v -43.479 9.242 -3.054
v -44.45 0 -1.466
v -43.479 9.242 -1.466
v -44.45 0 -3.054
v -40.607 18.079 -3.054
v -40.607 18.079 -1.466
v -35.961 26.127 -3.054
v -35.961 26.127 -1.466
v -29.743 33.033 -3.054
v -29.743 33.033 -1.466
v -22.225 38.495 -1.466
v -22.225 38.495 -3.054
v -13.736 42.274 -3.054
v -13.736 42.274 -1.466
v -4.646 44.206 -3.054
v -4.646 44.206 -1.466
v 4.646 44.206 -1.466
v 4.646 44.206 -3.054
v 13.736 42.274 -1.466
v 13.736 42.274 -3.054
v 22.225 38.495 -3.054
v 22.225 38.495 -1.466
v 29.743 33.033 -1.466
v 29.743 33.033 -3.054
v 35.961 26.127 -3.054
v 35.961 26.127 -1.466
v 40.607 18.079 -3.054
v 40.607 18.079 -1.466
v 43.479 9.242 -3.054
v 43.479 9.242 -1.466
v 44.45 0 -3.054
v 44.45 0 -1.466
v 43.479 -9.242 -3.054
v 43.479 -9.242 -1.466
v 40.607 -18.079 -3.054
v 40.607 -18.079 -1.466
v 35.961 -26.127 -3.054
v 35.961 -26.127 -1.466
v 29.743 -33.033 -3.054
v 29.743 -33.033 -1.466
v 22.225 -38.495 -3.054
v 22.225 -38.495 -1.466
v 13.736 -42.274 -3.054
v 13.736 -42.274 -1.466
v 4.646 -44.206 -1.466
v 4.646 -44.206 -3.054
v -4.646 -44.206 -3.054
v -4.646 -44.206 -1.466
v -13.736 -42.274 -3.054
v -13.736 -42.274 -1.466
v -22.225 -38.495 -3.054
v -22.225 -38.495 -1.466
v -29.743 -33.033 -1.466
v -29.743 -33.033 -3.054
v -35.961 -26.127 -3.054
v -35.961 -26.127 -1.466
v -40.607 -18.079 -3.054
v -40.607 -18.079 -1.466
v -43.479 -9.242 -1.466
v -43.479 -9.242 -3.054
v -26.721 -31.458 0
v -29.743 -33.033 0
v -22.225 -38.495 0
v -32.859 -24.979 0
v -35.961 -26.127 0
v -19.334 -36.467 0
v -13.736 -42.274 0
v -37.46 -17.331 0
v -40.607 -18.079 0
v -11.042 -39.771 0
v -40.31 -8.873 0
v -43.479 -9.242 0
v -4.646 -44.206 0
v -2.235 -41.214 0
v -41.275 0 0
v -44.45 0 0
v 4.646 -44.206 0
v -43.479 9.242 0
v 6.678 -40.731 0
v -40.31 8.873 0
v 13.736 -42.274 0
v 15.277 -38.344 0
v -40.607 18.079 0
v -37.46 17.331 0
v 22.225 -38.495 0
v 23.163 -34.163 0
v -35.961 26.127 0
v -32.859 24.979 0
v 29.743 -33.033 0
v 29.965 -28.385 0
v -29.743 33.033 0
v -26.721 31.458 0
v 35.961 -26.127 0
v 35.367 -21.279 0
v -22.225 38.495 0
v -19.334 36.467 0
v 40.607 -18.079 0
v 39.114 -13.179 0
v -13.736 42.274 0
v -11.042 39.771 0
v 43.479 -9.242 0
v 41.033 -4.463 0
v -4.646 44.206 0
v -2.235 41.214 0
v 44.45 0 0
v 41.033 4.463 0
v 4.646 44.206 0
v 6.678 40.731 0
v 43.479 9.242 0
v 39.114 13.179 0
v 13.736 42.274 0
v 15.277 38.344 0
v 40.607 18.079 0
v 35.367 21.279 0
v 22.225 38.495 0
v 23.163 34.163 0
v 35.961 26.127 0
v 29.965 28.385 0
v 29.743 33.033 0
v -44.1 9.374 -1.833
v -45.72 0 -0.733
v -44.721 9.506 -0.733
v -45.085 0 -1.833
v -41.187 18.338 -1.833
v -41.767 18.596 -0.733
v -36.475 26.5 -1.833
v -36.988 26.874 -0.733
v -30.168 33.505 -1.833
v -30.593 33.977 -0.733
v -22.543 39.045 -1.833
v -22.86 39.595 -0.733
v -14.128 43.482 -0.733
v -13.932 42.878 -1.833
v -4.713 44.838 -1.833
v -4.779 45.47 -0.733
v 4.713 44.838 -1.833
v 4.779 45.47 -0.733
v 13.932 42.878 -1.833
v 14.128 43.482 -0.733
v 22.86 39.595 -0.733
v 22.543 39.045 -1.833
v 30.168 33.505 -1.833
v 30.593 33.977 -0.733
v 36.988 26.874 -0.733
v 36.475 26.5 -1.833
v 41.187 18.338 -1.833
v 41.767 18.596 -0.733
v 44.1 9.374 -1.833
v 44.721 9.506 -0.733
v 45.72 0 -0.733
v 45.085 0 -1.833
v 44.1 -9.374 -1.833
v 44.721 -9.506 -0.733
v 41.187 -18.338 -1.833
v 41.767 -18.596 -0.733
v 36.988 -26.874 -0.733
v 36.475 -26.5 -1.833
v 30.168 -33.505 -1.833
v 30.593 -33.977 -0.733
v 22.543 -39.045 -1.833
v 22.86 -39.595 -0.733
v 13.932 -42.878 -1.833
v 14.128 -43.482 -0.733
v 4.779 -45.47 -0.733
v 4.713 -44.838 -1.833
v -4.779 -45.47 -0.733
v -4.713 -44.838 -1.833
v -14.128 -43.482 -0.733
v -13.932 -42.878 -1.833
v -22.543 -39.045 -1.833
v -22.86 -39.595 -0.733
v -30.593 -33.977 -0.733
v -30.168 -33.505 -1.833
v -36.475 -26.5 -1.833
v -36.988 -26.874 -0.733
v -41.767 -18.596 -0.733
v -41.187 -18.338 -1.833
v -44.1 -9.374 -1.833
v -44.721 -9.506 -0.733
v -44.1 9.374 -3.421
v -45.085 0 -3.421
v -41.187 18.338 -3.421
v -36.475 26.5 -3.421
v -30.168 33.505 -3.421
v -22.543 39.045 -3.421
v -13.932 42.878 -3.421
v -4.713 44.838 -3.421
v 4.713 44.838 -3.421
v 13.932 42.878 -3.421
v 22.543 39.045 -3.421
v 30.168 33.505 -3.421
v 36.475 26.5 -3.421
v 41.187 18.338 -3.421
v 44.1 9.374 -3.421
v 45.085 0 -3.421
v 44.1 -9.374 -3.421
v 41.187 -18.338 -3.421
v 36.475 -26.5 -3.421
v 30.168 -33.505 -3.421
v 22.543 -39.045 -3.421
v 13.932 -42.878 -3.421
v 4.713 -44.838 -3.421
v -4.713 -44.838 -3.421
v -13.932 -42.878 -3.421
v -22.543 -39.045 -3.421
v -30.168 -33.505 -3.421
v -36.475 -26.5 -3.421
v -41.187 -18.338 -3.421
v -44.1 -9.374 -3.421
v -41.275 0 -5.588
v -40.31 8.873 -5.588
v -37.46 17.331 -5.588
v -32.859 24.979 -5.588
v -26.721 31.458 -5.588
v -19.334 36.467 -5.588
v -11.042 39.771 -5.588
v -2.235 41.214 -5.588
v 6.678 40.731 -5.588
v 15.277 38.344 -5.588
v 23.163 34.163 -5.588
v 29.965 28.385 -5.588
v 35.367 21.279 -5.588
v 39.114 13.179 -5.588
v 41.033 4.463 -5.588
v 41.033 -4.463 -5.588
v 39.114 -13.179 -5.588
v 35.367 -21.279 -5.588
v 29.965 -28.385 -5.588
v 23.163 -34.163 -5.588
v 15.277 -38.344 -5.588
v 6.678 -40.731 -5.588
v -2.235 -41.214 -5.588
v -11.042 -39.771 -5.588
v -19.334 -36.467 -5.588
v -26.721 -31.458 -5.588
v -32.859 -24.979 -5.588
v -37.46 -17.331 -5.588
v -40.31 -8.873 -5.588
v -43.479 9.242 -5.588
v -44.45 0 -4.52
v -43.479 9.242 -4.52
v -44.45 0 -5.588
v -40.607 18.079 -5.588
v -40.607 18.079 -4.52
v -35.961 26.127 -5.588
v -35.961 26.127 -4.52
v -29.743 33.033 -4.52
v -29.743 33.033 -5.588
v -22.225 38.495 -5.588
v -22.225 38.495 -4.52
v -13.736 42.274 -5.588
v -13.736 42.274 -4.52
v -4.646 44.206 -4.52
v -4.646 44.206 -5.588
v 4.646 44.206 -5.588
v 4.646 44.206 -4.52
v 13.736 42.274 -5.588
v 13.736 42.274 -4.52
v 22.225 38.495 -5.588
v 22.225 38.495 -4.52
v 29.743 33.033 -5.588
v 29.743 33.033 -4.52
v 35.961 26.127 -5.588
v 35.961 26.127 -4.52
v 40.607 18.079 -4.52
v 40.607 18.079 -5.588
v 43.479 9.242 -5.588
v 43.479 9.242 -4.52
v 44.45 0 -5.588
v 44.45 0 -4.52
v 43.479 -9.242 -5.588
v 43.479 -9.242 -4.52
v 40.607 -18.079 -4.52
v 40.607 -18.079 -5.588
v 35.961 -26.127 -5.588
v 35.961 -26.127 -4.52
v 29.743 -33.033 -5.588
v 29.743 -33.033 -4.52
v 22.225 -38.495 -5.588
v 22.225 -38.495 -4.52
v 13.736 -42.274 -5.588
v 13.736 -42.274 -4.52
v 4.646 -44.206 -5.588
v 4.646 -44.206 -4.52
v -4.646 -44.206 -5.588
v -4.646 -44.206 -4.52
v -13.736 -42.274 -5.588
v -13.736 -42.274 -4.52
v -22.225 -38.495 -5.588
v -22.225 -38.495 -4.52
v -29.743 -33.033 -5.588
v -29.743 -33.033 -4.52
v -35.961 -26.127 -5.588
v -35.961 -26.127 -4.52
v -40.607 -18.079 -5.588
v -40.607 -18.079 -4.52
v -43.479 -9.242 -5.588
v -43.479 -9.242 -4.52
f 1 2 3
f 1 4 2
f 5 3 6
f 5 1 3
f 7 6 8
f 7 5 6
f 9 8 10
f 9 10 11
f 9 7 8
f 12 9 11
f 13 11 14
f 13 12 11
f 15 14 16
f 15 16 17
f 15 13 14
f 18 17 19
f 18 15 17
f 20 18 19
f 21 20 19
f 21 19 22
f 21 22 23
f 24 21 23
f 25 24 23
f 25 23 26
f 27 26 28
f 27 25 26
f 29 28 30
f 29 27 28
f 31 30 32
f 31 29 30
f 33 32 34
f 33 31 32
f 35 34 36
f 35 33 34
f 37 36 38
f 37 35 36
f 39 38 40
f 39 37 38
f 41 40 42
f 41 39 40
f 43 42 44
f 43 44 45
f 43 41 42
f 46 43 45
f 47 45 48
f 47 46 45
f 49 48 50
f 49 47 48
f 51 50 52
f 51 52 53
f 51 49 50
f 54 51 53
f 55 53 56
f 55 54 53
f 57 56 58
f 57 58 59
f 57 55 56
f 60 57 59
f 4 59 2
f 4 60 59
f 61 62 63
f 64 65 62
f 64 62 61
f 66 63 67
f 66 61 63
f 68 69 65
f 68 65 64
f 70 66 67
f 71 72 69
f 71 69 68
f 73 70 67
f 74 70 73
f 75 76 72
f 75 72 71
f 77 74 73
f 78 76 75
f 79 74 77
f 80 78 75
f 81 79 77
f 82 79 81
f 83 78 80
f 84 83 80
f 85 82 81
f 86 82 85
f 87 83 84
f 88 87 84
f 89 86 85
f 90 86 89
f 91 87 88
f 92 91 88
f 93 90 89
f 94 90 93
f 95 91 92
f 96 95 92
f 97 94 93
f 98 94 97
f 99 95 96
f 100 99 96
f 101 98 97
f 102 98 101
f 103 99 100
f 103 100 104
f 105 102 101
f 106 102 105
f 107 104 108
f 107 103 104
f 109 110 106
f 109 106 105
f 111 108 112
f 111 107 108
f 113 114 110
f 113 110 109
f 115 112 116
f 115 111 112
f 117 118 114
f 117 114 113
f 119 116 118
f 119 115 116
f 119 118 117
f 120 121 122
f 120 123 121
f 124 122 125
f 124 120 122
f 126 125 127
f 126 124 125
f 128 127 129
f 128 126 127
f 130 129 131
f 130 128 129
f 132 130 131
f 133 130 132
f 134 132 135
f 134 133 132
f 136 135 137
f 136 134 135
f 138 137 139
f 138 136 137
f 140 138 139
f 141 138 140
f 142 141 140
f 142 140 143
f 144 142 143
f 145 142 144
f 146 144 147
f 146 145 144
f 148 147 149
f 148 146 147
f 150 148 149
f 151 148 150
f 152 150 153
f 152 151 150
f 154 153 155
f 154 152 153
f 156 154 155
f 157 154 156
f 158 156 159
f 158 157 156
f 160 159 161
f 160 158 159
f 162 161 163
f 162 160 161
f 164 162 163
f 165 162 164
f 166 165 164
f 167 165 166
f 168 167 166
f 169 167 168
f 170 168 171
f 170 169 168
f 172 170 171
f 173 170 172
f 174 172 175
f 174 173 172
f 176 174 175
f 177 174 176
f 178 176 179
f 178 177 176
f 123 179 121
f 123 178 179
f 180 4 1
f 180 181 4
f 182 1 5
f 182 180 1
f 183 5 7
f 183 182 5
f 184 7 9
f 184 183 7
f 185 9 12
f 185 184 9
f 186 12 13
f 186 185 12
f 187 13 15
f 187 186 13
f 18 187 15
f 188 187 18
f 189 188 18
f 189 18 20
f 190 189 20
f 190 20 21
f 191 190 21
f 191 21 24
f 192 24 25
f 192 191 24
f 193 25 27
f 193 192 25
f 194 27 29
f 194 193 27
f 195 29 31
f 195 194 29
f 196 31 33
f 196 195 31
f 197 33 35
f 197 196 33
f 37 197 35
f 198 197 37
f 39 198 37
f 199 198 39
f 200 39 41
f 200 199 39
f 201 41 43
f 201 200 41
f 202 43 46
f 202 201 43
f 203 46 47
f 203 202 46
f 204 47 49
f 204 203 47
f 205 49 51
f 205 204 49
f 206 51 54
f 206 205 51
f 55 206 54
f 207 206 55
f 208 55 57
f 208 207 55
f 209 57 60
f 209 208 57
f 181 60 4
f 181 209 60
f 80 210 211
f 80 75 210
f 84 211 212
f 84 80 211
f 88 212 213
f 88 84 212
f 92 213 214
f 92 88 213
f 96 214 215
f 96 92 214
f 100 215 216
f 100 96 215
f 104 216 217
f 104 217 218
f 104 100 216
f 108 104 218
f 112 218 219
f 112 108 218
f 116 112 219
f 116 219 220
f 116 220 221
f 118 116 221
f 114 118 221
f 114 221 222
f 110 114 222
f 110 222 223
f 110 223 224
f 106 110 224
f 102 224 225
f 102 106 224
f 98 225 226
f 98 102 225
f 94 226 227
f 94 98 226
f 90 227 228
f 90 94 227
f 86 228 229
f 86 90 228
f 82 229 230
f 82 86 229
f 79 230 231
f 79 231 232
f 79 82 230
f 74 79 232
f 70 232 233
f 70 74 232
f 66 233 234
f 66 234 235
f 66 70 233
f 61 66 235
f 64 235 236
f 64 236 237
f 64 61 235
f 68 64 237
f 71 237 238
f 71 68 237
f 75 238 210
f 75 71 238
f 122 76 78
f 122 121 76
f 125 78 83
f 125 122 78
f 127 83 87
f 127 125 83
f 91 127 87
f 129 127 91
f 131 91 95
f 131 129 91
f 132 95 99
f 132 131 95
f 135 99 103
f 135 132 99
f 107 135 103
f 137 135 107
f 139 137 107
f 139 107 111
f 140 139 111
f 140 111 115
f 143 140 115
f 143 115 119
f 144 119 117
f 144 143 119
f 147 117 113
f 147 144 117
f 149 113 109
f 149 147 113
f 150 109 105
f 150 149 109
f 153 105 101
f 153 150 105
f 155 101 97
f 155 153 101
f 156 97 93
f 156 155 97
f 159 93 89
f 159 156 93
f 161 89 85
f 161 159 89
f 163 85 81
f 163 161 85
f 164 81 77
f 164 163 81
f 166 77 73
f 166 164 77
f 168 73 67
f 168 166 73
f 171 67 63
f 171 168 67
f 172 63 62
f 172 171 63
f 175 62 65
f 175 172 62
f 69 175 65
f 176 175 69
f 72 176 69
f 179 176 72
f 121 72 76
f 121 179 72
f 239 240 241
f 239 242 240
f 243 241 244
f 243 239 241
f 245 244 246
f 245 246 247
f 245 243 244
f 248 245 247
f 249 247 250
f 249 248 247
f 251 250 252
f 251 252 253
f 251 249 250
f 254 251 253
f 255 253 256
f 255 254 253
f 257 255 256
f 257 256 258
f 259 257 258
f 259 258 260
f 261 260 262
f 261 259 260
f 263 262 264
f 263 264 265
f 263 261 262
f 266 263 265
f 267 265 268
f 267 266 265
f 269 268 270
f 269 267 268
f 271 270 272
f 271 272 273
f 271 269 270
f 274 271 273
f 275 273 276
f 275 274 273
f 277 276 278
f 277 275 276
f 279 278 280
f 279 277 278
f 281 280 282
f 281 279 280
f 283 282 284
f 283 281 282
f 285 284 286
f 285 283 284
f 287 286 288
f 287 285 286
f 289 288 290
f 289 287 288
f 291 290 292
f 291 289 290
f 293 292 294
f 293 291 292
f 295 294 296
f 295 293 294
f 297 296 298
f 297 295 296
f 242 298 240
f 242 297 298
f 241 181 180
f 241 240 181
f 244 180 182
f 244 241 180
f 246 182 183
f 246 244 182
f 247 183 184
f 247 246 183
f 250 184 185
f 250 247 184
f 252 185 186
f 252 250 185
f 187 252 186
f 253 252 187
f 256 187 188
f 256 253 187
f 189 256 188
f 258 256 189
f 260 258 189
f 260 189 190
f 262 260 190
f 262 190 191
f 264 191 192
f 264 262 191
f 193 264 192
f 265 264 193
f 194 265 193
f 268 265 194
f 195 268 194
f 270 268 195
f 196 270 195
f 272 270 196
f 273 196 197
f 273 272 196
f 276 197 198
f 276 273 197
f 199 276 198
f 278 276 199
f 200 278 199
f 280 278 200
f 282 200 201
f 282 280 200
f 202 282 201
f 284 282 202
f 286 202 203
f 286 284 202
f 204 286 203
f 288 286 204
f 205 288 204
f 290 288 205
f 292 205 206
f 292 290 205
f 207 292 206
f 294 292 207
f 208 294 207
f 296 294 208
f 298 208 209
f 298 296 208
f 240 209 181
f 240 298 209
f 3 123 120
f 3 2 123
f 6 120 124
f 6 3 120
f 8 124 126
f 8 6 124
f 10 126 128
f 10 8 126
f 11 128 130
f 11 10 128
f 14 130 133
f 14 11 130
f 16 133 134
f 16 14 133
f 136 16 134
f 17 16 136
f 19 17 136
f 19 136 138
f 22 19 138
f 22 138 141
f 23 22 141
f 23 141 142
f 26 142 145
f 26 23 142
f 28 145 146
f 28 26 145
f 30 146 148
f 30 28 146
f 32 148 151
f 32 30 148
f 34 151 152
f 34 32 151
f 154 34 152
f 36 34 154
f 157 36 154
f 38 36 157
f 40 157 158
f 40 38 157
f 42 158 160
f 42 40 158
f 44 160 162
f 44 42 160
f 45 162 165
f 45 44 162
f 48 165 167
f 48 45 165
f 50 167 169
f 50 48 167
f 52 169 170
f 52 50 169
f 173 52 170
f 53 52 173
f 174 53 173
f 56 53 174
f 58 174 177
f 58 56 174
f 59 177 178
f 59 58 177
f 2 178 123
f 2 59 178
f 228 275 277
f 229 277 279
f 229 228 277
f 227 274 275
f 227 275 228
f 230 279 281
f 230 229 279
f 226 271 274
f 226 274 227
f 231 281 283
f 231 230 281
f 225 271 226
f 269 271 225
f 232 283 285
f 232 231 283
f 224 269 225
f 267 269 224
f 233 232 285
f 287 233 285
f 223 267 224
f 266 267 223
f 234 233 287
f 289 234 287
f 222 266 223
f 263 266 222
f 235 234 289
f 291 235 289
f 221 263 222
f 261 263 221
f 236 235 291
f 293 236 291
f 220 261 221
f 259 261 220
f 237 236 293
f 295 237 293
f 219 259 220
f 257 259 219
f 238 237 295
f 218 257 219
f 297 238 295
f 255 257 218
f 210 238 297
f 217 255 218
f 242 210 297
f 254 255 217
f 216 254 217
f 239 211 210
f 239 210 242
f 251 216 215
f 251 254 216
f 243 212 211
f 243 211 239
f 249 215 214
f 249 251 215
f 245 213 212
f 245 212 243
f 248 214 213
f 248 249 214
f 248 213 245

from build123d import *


with BuildPart() as f1:
    # F0 (on Front) → F1 (revolve)
    with BuildSketch(Plane.XZ):
        Polygon((-41.275, 0), (-44.45, 0), (-44.45, -1.46647), (-44.45, -3.05397), (-44.45, -4.520439), (-44.45, -5.588), (-41.275, -5.588), align=None)
        Polygon((-44.45, -1.46647), (-44.45, 0), (-45.72, -0.733235), (-45.085, -1.833087), align=None)
        Polygon((-44.45, -4.520439), (-44.45, -3.05397), (-45.085, -3.420587), align=None)
    revolve(axis=Axis((0, 0, -1.429696), (0, 0, -1)))


solid = f1.part
